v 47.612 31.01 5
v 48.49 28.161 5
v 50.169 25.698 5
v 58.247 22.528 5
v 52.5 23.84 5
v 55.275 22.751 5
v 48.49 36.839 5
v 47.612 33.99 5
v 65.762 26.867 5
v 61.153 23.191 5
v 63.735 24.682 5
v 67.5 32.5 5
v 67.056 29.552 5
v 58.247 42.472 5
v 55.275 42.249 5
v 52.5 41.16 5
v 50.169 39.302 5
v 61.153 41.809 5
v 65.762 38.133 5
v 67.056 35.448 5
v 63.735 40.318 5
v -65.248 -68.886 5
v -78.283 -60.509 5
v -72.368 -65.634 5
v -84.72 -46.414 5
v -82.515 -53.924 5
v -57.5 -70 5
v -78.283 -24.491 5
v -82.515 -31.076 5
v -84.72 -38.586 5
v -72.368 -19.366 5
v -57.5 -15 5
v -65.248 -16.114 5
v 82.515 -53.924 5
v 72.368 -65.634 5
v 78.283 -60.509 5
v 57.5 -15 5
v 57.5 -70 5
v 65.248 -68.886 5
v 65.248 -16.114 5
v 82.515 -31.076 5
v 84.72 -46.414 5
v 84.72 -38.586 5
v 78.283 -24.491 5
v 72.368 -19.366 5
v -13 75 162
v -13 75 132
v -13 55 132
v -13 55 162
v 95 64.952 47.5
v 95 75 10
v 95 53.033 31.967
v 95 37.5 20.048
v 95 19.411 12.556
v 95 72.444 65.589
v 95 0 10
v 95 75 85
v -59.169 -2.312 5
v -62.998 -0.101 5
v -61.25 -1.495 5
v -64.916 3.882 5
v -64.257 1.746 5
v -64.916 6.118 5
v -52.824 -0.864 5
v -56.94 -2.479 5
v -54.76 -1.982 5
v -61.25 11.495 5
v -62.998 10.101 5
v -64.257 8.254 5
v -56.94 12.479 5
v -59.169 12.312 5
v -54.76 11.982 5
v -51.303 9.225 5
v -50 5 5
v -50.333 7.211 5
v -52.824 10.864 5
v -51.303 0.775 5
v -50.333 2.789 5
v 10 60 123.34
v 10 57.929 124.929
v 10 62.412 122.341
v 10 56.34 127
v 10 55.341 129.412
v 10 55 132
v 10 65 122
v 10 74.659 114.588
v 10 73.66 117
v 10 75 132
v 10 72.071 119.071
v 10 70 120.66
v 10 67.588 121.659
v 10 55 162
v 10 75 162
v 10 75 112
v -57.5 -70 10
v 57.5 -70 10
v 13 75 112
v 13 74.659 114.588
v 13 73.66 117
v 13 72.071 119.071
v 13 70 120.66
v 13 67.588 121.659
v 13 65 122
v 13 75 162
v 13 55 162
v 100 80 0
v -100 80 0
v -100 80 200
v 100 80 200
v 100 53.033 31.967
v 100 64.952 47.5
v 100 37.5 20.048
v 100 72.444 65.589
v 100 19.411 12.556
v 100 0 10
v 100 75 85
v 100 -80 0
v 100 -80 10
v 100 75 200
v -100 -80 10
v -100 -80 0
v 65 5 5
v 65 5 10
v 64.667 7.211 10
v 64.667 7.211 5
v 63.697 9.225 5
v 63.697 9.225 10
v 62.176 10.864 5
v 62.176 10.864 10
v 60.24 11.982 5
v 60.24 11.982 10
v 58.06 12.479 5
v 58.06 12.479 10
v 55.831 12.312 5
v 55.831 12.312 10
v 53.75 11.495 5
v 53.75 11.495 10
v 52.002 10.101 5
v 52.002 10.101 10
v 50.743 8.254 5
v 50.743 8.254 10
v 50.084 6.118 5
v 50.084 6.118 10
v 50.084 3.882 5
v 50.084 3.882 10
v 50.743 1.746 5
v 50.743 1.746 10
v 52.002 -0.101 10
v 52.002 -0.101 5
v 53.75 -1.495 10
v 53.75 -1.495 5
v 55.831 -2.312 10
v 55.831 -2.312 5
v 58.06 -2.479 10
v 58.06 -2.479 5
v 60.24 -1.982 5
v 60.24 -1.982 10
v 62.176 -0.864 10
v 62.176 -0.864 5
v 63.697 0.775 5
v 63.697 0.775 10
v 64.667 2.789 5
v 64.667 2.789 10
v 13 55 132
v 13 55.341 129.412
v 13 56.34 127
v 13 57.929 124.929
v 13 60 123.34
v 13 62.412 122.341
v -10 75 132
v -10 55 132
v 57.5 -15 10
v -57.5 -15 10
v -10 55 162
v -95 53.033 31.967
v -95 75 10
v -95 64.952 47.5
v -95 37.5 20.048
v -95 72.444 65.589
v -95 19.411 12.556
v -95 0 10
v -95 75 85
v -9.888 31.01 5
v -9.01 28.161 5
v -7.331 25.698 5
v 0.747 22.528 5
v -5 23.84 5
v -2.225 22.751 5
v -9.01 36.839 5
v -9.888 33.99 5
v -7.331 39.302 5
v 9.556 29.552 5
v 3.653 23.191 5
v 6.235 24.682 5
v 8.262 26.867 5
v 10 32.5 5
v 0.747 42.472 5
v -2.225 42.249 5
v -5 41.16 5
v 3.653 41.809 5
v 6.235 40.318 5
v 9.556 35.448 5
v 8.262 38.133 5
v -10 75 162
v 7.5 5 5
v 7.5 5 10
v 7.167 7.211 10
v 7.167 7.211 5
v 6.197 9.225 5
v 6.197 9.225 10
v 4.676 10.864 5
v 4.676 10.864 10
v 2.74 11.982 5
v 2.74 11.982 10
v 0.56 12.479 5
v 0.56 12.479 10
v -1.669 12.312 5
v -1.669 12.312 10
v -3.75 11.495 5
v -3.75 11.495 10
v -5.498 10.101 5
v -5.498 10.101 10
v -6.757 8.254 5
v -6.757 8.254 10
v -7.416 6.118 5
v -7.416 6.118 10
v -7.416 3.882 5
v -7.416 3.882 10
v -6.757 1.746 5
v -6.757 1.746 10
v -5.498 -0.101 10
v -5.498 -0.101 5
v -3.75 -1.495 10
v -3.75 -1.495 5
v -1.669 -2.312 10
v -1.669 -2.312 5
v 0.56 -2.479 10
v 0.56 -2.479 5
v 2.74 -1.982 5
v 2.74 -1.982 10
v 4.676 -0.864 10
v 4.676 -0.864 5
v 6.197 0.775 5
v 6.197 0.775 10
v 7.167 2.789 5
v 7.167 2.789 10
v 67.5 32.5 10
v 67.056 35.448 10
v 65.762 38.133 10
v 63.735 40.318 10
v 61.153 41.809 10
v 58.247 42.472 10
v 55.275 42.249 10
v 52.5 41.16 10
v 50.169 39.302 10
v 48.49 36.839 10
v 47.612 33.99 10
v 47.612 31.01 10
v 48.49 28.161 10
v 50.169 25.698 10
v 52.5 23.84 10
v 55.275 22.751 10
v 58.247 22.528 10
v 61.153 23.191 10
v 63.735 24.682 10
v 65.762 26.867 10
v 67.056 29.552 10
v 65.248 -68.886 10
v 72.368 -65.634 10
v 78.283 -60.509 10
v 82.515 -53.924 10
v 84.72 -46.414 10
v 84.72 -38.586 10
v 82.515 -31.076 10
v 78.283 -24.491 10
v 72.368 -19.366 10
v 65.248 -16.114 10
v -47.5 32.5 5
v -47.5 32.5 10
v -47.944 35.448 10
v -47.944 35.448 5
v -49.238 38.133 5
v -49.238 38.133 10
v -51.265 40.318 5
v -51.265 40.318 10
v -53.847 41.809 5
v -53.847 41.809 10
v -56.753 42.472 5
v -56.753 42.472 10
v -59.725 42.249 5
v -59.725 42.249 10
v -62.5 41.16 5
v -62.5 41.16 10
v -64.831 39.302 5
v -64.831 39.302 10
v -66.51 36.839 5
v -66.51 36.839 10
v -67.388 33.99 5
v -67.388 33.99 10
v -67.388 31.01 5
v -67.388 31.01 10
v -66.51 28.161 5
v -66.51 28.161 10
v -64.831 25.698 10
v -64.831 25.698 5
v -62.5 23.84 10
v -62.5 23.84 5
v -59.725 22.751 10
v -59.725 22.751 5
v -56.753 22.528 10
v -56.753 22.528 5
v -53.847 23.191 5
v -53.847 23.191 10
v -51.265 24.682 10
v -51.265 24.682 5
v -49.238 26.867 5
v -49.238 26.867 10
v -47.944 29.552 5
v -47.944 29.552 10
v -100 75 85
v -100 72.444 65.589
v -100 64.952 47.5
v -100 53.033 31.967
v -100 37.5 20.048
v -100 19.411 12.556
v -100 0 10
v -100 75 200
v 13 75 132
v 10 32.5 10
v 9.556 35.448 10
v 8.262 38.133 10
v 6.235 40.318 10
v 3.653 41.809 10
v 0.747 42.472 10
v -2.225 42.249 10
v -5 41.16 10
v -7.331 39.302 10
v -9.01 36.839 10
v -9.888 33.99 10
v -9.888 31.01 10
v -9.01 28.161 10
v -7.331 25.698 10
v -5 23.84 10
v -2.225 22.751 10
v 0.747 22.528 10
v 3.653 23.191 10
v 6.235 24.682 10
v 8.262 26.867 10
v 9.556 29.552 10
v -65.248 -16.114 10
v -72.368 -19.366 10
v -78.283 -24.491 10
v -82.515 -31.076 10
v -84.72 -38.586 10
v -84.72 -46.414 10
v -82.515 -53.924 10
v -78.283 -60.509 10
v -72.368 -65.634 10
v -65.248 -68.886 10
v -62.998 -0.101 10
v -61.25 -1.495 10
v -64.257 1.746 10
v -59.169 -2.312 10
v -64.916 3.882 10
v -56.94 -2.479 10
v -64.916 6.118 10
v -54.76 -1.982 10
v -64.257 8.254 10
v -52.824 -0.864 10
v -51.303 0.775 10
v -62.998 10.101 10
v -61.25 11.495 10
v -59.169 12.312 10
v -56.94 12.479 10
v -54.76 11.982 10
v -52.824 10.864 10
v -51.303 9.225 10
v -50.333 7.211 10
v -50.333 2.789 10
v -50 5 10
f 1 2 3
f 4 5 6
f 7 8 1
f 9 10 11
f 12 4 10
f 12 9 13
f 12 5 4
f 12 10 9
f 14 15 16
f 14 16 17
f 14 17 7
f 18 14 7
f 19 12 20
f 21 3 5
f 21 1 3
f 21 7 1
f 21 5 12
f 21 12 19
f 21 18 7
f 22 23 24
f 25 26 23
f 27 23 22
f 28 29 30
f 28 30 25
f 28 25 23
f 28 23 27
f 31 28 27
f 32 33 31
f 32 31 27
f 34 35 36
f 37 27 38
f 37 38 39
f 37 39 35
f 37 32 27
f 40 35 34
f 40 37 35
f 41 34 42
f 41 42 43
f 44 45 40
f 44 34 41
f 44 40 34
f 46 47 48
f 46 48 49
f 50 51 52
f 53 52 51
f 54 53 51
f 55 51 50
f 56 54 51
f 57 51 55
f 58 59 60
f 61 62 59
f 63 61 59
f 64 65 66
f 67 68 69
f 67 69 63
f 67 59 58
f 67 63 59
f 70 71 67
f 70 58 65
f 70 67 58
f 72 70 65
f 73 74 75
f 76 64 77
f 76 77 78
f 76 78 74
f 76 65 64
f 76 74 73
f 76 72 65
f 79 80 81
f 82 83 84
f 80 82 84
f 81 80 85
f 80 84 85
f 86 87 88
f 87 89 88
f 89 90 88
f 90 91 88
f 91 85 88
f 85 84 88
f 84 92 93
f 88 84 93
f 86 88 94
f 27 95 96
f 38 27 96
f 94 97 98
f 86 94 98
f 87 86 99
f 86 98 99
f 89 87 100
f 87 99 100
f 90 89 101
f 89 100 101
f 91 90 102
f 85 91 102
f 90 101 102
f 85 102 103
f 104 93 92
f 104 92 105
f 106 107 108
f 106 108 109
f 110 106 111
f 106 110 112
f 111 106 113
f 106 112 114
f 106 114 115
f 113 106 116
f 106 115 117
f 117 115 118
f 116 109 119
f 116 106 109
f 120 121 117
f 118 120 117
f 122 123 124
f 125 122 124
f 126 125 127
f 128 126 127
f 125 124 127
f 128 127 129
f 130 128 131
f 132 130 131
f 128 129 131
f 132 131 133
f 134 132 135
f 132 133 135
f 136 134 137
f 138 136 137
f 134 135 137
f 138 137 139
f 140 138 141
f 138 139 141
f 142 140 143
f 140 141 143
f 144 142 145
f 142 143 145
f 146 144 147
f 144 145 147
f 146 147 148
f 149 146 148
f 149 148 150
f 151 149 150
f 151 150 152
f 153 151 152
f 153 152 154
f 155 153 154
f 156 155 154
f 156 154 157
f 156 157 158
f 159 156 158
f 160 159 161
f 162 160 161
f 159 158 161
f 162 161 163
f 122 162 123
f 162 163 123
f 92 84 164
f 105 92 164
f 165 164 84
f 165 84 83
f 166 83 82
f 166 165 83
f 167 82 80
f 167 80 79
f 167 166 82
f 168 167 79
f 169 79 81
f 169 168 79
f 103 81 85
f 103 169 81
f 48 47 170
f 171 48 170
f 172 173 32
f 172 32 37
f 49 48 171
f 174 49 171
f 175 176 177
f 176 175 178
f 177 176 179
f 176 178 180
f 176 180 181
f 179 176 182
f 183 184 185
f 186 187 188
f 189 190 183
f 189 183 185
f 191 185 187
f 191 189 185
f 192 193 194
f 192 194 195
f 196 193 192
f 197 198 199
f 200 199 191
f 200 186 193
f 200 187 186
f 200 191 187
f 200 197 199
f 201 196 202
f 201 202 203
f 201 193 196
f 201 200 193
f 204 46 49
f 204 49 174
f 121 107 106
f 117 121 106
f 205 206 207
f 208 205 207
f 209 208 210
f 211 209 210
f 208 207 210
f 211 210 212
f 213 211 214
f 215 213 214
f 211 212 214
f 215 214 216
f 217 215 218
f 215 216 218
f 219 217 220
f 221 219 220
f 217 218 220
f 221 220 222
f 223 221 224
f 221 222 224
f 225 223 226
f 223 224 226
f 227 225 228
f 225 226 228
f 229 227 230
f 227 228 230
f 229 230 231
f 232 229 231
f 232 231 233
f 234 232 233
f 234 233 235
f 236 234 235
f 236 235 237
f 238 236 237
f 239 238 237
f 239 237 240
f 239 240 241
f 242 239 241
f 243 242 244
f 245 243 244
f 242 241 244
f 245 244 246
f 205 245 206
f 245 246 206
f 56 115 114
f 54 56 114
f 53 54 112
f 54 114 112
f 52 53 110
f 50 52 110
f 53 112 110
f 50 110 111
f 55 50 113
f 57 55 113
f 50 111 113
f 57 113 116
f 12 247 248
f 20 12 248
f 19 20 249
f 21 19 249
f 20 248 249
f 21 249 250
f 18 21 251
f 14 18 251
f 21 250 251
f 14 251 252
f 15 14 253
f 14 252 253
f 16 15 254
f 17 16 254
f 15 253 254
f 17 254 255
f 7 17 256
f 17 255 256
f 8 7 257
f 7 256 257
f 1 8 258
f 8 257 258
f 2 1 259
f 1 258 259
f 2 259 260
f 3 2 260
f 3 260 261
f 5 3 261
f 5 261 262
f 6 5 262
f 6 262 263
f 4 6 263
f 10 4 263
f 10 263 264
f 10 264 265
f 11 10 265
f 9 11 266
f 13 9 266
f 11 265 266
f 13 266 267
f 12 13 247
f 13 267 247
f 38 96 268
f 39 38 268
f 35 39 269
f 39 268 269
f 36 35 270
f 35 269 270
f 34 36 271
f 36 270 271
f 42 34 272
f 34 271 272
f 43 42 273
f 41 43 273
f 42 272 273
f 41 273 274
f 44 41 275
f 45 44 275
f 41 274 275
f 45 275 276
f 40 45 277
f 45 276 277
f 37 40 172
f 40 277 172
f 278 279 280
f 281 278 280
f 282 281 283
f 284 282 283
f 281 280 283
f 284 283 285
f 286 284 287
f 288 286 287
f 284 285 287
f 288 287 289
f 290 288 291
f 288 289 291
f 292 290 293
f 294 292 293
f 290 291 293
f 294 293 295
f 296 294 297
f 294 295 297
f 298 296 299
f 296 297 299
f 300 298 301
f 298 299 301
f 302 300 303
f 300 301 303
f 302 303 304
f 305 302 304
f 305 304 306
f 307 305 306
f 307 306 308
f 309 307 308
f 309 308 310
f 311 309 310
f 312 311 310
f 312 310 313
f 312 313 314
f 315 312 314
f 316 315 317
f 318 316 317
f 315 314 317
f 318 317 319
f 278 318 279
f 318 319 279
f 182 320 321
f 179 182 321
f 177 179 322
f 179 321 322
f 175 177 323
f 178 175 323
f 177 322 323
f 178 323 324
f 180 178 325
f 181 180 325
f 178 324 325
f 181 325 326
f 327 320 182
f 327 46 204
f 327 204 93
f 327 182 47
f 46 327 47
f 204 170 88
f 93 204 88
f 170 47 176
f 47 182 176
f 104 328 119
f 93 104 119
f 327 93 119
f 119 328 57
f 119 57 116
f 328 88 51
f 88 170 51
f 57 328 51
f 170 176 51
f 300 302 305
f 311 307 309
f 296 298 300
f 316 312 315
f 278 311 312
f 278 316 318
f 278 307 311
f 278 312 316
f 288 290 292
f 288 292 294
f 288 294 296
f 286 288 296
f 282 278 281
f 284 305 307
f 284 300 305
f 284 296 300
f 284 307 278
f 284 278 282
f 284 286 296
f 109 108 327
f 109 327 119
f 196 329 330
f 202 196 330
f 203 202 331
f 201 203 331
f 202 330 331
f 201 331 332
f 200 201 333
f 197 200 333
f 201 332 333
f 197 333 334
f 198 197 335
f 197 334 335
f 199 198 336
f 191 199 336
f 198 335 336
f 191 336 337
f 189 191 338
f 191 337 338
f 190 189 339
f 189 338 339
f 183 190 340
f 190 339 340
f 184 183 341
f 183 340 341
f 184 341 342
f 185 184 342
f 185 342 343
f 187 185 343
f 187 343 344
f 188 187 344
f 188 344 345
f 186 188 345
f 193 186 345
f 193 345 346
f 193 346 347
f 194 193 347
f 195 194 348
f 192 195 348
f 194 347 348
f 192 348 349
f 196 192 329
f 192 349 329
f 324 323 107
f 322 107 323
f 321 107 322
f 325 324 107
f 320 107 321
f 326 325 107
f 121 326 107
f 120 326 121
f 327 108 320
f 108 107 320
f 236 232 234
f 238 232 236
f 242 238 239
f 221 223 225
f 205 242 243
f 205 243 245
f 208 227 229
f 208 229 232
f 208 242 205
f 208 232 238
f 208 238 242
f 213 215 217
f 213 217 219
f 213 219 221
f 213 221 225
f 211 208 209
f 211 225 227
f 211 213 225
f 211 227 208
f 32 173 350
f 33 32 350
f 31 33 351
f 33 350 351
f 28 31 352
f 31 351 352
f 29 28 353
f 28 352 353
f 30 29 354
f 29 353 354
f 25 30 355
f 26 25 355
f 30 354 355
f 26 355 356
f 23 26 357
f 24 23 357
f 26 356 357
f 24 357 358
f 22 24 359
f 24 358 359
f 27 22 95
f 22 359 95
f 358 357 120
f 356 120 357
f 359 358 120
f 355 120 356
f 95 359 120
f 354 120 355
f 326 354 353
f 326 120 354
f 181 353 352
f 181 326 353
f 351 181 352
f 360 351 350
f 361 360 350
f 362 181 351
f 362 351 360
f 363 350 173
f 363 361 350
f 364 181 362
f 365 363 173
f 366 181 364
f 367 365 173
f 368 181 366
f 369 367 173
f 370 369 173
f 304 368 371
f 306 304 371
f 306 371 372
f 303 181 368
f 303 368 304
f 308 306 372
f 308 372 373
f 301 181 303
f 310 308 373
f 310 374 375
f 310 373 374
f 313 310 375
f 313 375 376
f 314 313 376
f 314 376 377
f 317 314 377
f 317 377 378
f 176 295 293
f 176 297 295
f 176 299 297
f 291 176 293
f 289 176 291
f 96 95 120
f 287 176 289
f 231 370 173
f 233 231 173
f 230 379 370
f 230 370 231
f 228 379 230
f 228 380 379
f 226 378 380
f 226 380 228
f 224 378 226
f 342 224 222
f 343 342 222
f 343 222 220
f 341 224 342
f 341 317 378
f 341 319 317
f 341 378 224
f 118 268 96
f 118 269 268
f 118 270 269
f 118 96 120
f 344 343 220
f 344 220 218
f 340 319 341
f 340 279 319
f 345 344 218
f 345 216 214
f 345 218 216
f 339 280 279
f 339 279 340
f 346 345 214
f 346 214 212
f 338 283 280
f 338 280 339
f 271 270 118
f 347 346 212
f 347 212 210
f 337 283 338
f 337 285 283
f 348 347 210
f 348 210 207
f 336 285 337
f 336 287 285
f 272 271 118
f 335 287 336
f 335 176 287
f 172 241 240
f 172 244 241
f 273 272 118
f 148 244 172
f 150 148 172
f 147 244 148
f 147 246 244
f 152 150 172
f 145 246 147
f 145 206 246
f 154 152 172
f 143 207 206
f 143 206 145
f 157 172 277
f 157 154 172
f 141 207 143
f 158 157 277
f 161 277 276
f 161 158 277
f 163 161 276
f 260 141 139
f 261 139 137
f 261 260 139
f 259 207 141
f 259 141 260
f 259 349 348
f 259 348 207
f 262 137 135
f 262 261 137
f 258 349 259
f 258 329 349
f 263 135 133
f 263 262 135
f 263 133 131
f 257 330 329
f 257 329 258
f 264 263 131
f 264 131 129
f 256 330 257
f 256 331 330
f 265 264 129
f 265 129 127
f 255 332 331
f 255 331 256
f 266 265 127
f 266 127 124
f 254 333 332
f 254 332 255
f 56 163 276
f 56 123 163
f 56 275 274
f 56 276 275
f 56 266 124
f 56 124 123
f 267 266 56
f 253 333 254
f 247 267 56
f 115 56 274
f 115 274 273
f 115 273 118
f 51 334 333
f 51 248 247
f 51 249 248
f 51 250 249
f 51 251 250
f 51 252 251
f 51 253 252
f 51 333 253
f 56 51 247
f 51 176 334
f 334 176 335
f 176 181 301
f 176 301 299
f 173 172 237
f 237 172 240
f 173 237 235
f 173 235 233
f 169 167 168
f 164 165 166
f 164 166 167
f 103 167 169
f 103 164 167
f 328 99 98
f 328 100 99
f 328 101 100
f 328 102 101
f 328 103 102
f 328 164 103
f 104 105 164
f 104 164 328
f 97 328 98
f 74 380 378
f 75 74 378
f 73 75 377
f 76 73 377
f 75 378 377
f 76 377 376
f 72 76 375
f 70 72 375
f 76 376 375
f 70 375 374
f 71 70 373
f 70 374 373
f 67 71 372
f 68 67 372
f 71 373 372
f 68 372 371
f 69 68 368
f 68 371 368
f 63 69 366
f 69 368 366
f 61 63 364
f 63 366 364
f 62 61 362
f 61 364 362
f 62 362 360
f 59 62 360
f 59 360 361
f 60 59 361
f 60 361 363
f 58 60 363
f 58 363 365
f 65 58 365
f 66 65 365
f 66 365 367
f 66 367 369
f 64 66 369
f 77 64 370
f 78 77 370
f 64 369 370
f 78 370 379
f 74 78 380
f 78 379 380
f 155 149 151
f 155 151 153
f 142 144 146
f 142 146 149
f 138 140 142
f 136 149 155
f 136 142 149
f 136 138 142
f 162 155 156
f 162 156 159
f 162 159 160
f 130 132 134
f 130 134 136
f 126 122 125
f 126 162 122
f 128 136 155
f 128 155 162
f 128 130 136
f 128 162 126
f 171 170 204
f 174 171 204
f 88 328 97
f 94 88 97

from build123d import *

# Parameters (mm, degrees)
SKETCH_W      = 200
SKETCH_H      = 160
PAD_DEPTH     = 10
SKETCH001_R   = 7.5
SKETCH001_R_2 = 10
POCKET_DEPTH  = 5
SKETCH002_W   = 200
SKETCH002_H   = 5
PAD001_DEPTH  = 190
PAD002_DEPTH  = 5
PAD003_DEPTH  = 5
SKETCH005_W   = 3
SKETCH005_H   = 30
PAD004_DEPTH  = 20
PAD005_DEPTH  = 3


with BuildPart() as part:
    # Sketch → Pad (new body)
    with BuildSketch(Plane.XY):
        Rectangle(SKETCH_W, SKETCH_H)
    extrude(amount=PAD_DEPTH)

    # Sketch001 → Pocket (cut)
    with BuildSketch(Plane.XY.offset(10)):
        with Locations((57.5, 5)):
            Circle(SKETCH001_R)
        with Locations((0, 5)):
            Circle(SKETCH001_R)
        with Locations((-57.5, 5)):
            Circle(SKETCH001_R)
        with Locations((-57.5, 32.5)):
            Circle(SKETCH001_R_2)
        with Locations((0, 32.5)):
            Circle(SKETCH001_R_2)
        with Locations((57.5, 32.5)):
            Circle(SKETCH001_R_2)
        with BuildLine():
            ThreePointArc((-57.5, -15), (-85, -42.5), (-57.5, -70))
            Line((-57.5, -70), (57.5, -70))
            ThreePointArc((57.5, -70), (85, -42.5), (57.5, -15))
            Line((-57.5, -15), (57.5, -15))
        make_face()
    extrude(amount=-POCKET_DEPTH, mode=Mode.SUBTRACT)

    # Sketch002 → Pad001 (new body)
    with BuildSketch(Plane.XY.offset(10)):
        with Locations((0, 77.5)):
            Rectangle(SKETCH002_W, SKETCH002_H)
    extrude(amount=PAD001_DEPTH)

    # Sketch003 → Pad002 (new body)
    with BuildSketch(Plane.YZ.offset(100)):
        with BuildLine():
            Line((75, 10), (0, 10))
            ThreePointArc((0, 10), (53.033009, 31.966991), (75, 85))
            Line((75, 10), (75, 85))
        make_face()
    extrude(amount=-PAD002_DEPTH)

    # Sketch004 → Pad003 (new body)
    with BuildSketch(Plane(origin=(-100, 0, 0), x_dir=(0, -1, 0), z_dir=(-1, 0, 0))):
        with BuildLine():
            Line((-75, 10), (0, 10))
            ThreePointArc((-75, 85), (-53.033009, 31.966991), (0, 10))
            Line((-75, 10), (-75, 85))
        make_face()
    extrude(amount=-PAD003_DEPTH)

    # Sketch005 → Pad004 (new body)
    with BuildSketch(Plane.XZ.offset(-75)):
        with Locations((-11.5, 147)):
            Rectangle(SKETCH005_W, SKETCH005_H)
        with Locations((11.5, 147)):
            Rectangle(SKETCH005_W, SKETCH005_H)
    extrude(amount=PAD004_DEPTH)

    # Sketch006 → Pad005 (new body)
    with BuildSketch(Plane.YZ.offset(13)):
        with BuildLine():
            ThreePointArc((55, 132), (57.928932, 124.928932), (65, 122))
            ThreePointArc((74.999966, 111.999966), (72.071058, 119.071044), (65, 122))
            Line((75, 132), (74.999966, 111.999966))
            Line((55, 132), (75, 132))
        make_face()
    extrude(amount=-PAD005_DEPTH)


solid = part.part
